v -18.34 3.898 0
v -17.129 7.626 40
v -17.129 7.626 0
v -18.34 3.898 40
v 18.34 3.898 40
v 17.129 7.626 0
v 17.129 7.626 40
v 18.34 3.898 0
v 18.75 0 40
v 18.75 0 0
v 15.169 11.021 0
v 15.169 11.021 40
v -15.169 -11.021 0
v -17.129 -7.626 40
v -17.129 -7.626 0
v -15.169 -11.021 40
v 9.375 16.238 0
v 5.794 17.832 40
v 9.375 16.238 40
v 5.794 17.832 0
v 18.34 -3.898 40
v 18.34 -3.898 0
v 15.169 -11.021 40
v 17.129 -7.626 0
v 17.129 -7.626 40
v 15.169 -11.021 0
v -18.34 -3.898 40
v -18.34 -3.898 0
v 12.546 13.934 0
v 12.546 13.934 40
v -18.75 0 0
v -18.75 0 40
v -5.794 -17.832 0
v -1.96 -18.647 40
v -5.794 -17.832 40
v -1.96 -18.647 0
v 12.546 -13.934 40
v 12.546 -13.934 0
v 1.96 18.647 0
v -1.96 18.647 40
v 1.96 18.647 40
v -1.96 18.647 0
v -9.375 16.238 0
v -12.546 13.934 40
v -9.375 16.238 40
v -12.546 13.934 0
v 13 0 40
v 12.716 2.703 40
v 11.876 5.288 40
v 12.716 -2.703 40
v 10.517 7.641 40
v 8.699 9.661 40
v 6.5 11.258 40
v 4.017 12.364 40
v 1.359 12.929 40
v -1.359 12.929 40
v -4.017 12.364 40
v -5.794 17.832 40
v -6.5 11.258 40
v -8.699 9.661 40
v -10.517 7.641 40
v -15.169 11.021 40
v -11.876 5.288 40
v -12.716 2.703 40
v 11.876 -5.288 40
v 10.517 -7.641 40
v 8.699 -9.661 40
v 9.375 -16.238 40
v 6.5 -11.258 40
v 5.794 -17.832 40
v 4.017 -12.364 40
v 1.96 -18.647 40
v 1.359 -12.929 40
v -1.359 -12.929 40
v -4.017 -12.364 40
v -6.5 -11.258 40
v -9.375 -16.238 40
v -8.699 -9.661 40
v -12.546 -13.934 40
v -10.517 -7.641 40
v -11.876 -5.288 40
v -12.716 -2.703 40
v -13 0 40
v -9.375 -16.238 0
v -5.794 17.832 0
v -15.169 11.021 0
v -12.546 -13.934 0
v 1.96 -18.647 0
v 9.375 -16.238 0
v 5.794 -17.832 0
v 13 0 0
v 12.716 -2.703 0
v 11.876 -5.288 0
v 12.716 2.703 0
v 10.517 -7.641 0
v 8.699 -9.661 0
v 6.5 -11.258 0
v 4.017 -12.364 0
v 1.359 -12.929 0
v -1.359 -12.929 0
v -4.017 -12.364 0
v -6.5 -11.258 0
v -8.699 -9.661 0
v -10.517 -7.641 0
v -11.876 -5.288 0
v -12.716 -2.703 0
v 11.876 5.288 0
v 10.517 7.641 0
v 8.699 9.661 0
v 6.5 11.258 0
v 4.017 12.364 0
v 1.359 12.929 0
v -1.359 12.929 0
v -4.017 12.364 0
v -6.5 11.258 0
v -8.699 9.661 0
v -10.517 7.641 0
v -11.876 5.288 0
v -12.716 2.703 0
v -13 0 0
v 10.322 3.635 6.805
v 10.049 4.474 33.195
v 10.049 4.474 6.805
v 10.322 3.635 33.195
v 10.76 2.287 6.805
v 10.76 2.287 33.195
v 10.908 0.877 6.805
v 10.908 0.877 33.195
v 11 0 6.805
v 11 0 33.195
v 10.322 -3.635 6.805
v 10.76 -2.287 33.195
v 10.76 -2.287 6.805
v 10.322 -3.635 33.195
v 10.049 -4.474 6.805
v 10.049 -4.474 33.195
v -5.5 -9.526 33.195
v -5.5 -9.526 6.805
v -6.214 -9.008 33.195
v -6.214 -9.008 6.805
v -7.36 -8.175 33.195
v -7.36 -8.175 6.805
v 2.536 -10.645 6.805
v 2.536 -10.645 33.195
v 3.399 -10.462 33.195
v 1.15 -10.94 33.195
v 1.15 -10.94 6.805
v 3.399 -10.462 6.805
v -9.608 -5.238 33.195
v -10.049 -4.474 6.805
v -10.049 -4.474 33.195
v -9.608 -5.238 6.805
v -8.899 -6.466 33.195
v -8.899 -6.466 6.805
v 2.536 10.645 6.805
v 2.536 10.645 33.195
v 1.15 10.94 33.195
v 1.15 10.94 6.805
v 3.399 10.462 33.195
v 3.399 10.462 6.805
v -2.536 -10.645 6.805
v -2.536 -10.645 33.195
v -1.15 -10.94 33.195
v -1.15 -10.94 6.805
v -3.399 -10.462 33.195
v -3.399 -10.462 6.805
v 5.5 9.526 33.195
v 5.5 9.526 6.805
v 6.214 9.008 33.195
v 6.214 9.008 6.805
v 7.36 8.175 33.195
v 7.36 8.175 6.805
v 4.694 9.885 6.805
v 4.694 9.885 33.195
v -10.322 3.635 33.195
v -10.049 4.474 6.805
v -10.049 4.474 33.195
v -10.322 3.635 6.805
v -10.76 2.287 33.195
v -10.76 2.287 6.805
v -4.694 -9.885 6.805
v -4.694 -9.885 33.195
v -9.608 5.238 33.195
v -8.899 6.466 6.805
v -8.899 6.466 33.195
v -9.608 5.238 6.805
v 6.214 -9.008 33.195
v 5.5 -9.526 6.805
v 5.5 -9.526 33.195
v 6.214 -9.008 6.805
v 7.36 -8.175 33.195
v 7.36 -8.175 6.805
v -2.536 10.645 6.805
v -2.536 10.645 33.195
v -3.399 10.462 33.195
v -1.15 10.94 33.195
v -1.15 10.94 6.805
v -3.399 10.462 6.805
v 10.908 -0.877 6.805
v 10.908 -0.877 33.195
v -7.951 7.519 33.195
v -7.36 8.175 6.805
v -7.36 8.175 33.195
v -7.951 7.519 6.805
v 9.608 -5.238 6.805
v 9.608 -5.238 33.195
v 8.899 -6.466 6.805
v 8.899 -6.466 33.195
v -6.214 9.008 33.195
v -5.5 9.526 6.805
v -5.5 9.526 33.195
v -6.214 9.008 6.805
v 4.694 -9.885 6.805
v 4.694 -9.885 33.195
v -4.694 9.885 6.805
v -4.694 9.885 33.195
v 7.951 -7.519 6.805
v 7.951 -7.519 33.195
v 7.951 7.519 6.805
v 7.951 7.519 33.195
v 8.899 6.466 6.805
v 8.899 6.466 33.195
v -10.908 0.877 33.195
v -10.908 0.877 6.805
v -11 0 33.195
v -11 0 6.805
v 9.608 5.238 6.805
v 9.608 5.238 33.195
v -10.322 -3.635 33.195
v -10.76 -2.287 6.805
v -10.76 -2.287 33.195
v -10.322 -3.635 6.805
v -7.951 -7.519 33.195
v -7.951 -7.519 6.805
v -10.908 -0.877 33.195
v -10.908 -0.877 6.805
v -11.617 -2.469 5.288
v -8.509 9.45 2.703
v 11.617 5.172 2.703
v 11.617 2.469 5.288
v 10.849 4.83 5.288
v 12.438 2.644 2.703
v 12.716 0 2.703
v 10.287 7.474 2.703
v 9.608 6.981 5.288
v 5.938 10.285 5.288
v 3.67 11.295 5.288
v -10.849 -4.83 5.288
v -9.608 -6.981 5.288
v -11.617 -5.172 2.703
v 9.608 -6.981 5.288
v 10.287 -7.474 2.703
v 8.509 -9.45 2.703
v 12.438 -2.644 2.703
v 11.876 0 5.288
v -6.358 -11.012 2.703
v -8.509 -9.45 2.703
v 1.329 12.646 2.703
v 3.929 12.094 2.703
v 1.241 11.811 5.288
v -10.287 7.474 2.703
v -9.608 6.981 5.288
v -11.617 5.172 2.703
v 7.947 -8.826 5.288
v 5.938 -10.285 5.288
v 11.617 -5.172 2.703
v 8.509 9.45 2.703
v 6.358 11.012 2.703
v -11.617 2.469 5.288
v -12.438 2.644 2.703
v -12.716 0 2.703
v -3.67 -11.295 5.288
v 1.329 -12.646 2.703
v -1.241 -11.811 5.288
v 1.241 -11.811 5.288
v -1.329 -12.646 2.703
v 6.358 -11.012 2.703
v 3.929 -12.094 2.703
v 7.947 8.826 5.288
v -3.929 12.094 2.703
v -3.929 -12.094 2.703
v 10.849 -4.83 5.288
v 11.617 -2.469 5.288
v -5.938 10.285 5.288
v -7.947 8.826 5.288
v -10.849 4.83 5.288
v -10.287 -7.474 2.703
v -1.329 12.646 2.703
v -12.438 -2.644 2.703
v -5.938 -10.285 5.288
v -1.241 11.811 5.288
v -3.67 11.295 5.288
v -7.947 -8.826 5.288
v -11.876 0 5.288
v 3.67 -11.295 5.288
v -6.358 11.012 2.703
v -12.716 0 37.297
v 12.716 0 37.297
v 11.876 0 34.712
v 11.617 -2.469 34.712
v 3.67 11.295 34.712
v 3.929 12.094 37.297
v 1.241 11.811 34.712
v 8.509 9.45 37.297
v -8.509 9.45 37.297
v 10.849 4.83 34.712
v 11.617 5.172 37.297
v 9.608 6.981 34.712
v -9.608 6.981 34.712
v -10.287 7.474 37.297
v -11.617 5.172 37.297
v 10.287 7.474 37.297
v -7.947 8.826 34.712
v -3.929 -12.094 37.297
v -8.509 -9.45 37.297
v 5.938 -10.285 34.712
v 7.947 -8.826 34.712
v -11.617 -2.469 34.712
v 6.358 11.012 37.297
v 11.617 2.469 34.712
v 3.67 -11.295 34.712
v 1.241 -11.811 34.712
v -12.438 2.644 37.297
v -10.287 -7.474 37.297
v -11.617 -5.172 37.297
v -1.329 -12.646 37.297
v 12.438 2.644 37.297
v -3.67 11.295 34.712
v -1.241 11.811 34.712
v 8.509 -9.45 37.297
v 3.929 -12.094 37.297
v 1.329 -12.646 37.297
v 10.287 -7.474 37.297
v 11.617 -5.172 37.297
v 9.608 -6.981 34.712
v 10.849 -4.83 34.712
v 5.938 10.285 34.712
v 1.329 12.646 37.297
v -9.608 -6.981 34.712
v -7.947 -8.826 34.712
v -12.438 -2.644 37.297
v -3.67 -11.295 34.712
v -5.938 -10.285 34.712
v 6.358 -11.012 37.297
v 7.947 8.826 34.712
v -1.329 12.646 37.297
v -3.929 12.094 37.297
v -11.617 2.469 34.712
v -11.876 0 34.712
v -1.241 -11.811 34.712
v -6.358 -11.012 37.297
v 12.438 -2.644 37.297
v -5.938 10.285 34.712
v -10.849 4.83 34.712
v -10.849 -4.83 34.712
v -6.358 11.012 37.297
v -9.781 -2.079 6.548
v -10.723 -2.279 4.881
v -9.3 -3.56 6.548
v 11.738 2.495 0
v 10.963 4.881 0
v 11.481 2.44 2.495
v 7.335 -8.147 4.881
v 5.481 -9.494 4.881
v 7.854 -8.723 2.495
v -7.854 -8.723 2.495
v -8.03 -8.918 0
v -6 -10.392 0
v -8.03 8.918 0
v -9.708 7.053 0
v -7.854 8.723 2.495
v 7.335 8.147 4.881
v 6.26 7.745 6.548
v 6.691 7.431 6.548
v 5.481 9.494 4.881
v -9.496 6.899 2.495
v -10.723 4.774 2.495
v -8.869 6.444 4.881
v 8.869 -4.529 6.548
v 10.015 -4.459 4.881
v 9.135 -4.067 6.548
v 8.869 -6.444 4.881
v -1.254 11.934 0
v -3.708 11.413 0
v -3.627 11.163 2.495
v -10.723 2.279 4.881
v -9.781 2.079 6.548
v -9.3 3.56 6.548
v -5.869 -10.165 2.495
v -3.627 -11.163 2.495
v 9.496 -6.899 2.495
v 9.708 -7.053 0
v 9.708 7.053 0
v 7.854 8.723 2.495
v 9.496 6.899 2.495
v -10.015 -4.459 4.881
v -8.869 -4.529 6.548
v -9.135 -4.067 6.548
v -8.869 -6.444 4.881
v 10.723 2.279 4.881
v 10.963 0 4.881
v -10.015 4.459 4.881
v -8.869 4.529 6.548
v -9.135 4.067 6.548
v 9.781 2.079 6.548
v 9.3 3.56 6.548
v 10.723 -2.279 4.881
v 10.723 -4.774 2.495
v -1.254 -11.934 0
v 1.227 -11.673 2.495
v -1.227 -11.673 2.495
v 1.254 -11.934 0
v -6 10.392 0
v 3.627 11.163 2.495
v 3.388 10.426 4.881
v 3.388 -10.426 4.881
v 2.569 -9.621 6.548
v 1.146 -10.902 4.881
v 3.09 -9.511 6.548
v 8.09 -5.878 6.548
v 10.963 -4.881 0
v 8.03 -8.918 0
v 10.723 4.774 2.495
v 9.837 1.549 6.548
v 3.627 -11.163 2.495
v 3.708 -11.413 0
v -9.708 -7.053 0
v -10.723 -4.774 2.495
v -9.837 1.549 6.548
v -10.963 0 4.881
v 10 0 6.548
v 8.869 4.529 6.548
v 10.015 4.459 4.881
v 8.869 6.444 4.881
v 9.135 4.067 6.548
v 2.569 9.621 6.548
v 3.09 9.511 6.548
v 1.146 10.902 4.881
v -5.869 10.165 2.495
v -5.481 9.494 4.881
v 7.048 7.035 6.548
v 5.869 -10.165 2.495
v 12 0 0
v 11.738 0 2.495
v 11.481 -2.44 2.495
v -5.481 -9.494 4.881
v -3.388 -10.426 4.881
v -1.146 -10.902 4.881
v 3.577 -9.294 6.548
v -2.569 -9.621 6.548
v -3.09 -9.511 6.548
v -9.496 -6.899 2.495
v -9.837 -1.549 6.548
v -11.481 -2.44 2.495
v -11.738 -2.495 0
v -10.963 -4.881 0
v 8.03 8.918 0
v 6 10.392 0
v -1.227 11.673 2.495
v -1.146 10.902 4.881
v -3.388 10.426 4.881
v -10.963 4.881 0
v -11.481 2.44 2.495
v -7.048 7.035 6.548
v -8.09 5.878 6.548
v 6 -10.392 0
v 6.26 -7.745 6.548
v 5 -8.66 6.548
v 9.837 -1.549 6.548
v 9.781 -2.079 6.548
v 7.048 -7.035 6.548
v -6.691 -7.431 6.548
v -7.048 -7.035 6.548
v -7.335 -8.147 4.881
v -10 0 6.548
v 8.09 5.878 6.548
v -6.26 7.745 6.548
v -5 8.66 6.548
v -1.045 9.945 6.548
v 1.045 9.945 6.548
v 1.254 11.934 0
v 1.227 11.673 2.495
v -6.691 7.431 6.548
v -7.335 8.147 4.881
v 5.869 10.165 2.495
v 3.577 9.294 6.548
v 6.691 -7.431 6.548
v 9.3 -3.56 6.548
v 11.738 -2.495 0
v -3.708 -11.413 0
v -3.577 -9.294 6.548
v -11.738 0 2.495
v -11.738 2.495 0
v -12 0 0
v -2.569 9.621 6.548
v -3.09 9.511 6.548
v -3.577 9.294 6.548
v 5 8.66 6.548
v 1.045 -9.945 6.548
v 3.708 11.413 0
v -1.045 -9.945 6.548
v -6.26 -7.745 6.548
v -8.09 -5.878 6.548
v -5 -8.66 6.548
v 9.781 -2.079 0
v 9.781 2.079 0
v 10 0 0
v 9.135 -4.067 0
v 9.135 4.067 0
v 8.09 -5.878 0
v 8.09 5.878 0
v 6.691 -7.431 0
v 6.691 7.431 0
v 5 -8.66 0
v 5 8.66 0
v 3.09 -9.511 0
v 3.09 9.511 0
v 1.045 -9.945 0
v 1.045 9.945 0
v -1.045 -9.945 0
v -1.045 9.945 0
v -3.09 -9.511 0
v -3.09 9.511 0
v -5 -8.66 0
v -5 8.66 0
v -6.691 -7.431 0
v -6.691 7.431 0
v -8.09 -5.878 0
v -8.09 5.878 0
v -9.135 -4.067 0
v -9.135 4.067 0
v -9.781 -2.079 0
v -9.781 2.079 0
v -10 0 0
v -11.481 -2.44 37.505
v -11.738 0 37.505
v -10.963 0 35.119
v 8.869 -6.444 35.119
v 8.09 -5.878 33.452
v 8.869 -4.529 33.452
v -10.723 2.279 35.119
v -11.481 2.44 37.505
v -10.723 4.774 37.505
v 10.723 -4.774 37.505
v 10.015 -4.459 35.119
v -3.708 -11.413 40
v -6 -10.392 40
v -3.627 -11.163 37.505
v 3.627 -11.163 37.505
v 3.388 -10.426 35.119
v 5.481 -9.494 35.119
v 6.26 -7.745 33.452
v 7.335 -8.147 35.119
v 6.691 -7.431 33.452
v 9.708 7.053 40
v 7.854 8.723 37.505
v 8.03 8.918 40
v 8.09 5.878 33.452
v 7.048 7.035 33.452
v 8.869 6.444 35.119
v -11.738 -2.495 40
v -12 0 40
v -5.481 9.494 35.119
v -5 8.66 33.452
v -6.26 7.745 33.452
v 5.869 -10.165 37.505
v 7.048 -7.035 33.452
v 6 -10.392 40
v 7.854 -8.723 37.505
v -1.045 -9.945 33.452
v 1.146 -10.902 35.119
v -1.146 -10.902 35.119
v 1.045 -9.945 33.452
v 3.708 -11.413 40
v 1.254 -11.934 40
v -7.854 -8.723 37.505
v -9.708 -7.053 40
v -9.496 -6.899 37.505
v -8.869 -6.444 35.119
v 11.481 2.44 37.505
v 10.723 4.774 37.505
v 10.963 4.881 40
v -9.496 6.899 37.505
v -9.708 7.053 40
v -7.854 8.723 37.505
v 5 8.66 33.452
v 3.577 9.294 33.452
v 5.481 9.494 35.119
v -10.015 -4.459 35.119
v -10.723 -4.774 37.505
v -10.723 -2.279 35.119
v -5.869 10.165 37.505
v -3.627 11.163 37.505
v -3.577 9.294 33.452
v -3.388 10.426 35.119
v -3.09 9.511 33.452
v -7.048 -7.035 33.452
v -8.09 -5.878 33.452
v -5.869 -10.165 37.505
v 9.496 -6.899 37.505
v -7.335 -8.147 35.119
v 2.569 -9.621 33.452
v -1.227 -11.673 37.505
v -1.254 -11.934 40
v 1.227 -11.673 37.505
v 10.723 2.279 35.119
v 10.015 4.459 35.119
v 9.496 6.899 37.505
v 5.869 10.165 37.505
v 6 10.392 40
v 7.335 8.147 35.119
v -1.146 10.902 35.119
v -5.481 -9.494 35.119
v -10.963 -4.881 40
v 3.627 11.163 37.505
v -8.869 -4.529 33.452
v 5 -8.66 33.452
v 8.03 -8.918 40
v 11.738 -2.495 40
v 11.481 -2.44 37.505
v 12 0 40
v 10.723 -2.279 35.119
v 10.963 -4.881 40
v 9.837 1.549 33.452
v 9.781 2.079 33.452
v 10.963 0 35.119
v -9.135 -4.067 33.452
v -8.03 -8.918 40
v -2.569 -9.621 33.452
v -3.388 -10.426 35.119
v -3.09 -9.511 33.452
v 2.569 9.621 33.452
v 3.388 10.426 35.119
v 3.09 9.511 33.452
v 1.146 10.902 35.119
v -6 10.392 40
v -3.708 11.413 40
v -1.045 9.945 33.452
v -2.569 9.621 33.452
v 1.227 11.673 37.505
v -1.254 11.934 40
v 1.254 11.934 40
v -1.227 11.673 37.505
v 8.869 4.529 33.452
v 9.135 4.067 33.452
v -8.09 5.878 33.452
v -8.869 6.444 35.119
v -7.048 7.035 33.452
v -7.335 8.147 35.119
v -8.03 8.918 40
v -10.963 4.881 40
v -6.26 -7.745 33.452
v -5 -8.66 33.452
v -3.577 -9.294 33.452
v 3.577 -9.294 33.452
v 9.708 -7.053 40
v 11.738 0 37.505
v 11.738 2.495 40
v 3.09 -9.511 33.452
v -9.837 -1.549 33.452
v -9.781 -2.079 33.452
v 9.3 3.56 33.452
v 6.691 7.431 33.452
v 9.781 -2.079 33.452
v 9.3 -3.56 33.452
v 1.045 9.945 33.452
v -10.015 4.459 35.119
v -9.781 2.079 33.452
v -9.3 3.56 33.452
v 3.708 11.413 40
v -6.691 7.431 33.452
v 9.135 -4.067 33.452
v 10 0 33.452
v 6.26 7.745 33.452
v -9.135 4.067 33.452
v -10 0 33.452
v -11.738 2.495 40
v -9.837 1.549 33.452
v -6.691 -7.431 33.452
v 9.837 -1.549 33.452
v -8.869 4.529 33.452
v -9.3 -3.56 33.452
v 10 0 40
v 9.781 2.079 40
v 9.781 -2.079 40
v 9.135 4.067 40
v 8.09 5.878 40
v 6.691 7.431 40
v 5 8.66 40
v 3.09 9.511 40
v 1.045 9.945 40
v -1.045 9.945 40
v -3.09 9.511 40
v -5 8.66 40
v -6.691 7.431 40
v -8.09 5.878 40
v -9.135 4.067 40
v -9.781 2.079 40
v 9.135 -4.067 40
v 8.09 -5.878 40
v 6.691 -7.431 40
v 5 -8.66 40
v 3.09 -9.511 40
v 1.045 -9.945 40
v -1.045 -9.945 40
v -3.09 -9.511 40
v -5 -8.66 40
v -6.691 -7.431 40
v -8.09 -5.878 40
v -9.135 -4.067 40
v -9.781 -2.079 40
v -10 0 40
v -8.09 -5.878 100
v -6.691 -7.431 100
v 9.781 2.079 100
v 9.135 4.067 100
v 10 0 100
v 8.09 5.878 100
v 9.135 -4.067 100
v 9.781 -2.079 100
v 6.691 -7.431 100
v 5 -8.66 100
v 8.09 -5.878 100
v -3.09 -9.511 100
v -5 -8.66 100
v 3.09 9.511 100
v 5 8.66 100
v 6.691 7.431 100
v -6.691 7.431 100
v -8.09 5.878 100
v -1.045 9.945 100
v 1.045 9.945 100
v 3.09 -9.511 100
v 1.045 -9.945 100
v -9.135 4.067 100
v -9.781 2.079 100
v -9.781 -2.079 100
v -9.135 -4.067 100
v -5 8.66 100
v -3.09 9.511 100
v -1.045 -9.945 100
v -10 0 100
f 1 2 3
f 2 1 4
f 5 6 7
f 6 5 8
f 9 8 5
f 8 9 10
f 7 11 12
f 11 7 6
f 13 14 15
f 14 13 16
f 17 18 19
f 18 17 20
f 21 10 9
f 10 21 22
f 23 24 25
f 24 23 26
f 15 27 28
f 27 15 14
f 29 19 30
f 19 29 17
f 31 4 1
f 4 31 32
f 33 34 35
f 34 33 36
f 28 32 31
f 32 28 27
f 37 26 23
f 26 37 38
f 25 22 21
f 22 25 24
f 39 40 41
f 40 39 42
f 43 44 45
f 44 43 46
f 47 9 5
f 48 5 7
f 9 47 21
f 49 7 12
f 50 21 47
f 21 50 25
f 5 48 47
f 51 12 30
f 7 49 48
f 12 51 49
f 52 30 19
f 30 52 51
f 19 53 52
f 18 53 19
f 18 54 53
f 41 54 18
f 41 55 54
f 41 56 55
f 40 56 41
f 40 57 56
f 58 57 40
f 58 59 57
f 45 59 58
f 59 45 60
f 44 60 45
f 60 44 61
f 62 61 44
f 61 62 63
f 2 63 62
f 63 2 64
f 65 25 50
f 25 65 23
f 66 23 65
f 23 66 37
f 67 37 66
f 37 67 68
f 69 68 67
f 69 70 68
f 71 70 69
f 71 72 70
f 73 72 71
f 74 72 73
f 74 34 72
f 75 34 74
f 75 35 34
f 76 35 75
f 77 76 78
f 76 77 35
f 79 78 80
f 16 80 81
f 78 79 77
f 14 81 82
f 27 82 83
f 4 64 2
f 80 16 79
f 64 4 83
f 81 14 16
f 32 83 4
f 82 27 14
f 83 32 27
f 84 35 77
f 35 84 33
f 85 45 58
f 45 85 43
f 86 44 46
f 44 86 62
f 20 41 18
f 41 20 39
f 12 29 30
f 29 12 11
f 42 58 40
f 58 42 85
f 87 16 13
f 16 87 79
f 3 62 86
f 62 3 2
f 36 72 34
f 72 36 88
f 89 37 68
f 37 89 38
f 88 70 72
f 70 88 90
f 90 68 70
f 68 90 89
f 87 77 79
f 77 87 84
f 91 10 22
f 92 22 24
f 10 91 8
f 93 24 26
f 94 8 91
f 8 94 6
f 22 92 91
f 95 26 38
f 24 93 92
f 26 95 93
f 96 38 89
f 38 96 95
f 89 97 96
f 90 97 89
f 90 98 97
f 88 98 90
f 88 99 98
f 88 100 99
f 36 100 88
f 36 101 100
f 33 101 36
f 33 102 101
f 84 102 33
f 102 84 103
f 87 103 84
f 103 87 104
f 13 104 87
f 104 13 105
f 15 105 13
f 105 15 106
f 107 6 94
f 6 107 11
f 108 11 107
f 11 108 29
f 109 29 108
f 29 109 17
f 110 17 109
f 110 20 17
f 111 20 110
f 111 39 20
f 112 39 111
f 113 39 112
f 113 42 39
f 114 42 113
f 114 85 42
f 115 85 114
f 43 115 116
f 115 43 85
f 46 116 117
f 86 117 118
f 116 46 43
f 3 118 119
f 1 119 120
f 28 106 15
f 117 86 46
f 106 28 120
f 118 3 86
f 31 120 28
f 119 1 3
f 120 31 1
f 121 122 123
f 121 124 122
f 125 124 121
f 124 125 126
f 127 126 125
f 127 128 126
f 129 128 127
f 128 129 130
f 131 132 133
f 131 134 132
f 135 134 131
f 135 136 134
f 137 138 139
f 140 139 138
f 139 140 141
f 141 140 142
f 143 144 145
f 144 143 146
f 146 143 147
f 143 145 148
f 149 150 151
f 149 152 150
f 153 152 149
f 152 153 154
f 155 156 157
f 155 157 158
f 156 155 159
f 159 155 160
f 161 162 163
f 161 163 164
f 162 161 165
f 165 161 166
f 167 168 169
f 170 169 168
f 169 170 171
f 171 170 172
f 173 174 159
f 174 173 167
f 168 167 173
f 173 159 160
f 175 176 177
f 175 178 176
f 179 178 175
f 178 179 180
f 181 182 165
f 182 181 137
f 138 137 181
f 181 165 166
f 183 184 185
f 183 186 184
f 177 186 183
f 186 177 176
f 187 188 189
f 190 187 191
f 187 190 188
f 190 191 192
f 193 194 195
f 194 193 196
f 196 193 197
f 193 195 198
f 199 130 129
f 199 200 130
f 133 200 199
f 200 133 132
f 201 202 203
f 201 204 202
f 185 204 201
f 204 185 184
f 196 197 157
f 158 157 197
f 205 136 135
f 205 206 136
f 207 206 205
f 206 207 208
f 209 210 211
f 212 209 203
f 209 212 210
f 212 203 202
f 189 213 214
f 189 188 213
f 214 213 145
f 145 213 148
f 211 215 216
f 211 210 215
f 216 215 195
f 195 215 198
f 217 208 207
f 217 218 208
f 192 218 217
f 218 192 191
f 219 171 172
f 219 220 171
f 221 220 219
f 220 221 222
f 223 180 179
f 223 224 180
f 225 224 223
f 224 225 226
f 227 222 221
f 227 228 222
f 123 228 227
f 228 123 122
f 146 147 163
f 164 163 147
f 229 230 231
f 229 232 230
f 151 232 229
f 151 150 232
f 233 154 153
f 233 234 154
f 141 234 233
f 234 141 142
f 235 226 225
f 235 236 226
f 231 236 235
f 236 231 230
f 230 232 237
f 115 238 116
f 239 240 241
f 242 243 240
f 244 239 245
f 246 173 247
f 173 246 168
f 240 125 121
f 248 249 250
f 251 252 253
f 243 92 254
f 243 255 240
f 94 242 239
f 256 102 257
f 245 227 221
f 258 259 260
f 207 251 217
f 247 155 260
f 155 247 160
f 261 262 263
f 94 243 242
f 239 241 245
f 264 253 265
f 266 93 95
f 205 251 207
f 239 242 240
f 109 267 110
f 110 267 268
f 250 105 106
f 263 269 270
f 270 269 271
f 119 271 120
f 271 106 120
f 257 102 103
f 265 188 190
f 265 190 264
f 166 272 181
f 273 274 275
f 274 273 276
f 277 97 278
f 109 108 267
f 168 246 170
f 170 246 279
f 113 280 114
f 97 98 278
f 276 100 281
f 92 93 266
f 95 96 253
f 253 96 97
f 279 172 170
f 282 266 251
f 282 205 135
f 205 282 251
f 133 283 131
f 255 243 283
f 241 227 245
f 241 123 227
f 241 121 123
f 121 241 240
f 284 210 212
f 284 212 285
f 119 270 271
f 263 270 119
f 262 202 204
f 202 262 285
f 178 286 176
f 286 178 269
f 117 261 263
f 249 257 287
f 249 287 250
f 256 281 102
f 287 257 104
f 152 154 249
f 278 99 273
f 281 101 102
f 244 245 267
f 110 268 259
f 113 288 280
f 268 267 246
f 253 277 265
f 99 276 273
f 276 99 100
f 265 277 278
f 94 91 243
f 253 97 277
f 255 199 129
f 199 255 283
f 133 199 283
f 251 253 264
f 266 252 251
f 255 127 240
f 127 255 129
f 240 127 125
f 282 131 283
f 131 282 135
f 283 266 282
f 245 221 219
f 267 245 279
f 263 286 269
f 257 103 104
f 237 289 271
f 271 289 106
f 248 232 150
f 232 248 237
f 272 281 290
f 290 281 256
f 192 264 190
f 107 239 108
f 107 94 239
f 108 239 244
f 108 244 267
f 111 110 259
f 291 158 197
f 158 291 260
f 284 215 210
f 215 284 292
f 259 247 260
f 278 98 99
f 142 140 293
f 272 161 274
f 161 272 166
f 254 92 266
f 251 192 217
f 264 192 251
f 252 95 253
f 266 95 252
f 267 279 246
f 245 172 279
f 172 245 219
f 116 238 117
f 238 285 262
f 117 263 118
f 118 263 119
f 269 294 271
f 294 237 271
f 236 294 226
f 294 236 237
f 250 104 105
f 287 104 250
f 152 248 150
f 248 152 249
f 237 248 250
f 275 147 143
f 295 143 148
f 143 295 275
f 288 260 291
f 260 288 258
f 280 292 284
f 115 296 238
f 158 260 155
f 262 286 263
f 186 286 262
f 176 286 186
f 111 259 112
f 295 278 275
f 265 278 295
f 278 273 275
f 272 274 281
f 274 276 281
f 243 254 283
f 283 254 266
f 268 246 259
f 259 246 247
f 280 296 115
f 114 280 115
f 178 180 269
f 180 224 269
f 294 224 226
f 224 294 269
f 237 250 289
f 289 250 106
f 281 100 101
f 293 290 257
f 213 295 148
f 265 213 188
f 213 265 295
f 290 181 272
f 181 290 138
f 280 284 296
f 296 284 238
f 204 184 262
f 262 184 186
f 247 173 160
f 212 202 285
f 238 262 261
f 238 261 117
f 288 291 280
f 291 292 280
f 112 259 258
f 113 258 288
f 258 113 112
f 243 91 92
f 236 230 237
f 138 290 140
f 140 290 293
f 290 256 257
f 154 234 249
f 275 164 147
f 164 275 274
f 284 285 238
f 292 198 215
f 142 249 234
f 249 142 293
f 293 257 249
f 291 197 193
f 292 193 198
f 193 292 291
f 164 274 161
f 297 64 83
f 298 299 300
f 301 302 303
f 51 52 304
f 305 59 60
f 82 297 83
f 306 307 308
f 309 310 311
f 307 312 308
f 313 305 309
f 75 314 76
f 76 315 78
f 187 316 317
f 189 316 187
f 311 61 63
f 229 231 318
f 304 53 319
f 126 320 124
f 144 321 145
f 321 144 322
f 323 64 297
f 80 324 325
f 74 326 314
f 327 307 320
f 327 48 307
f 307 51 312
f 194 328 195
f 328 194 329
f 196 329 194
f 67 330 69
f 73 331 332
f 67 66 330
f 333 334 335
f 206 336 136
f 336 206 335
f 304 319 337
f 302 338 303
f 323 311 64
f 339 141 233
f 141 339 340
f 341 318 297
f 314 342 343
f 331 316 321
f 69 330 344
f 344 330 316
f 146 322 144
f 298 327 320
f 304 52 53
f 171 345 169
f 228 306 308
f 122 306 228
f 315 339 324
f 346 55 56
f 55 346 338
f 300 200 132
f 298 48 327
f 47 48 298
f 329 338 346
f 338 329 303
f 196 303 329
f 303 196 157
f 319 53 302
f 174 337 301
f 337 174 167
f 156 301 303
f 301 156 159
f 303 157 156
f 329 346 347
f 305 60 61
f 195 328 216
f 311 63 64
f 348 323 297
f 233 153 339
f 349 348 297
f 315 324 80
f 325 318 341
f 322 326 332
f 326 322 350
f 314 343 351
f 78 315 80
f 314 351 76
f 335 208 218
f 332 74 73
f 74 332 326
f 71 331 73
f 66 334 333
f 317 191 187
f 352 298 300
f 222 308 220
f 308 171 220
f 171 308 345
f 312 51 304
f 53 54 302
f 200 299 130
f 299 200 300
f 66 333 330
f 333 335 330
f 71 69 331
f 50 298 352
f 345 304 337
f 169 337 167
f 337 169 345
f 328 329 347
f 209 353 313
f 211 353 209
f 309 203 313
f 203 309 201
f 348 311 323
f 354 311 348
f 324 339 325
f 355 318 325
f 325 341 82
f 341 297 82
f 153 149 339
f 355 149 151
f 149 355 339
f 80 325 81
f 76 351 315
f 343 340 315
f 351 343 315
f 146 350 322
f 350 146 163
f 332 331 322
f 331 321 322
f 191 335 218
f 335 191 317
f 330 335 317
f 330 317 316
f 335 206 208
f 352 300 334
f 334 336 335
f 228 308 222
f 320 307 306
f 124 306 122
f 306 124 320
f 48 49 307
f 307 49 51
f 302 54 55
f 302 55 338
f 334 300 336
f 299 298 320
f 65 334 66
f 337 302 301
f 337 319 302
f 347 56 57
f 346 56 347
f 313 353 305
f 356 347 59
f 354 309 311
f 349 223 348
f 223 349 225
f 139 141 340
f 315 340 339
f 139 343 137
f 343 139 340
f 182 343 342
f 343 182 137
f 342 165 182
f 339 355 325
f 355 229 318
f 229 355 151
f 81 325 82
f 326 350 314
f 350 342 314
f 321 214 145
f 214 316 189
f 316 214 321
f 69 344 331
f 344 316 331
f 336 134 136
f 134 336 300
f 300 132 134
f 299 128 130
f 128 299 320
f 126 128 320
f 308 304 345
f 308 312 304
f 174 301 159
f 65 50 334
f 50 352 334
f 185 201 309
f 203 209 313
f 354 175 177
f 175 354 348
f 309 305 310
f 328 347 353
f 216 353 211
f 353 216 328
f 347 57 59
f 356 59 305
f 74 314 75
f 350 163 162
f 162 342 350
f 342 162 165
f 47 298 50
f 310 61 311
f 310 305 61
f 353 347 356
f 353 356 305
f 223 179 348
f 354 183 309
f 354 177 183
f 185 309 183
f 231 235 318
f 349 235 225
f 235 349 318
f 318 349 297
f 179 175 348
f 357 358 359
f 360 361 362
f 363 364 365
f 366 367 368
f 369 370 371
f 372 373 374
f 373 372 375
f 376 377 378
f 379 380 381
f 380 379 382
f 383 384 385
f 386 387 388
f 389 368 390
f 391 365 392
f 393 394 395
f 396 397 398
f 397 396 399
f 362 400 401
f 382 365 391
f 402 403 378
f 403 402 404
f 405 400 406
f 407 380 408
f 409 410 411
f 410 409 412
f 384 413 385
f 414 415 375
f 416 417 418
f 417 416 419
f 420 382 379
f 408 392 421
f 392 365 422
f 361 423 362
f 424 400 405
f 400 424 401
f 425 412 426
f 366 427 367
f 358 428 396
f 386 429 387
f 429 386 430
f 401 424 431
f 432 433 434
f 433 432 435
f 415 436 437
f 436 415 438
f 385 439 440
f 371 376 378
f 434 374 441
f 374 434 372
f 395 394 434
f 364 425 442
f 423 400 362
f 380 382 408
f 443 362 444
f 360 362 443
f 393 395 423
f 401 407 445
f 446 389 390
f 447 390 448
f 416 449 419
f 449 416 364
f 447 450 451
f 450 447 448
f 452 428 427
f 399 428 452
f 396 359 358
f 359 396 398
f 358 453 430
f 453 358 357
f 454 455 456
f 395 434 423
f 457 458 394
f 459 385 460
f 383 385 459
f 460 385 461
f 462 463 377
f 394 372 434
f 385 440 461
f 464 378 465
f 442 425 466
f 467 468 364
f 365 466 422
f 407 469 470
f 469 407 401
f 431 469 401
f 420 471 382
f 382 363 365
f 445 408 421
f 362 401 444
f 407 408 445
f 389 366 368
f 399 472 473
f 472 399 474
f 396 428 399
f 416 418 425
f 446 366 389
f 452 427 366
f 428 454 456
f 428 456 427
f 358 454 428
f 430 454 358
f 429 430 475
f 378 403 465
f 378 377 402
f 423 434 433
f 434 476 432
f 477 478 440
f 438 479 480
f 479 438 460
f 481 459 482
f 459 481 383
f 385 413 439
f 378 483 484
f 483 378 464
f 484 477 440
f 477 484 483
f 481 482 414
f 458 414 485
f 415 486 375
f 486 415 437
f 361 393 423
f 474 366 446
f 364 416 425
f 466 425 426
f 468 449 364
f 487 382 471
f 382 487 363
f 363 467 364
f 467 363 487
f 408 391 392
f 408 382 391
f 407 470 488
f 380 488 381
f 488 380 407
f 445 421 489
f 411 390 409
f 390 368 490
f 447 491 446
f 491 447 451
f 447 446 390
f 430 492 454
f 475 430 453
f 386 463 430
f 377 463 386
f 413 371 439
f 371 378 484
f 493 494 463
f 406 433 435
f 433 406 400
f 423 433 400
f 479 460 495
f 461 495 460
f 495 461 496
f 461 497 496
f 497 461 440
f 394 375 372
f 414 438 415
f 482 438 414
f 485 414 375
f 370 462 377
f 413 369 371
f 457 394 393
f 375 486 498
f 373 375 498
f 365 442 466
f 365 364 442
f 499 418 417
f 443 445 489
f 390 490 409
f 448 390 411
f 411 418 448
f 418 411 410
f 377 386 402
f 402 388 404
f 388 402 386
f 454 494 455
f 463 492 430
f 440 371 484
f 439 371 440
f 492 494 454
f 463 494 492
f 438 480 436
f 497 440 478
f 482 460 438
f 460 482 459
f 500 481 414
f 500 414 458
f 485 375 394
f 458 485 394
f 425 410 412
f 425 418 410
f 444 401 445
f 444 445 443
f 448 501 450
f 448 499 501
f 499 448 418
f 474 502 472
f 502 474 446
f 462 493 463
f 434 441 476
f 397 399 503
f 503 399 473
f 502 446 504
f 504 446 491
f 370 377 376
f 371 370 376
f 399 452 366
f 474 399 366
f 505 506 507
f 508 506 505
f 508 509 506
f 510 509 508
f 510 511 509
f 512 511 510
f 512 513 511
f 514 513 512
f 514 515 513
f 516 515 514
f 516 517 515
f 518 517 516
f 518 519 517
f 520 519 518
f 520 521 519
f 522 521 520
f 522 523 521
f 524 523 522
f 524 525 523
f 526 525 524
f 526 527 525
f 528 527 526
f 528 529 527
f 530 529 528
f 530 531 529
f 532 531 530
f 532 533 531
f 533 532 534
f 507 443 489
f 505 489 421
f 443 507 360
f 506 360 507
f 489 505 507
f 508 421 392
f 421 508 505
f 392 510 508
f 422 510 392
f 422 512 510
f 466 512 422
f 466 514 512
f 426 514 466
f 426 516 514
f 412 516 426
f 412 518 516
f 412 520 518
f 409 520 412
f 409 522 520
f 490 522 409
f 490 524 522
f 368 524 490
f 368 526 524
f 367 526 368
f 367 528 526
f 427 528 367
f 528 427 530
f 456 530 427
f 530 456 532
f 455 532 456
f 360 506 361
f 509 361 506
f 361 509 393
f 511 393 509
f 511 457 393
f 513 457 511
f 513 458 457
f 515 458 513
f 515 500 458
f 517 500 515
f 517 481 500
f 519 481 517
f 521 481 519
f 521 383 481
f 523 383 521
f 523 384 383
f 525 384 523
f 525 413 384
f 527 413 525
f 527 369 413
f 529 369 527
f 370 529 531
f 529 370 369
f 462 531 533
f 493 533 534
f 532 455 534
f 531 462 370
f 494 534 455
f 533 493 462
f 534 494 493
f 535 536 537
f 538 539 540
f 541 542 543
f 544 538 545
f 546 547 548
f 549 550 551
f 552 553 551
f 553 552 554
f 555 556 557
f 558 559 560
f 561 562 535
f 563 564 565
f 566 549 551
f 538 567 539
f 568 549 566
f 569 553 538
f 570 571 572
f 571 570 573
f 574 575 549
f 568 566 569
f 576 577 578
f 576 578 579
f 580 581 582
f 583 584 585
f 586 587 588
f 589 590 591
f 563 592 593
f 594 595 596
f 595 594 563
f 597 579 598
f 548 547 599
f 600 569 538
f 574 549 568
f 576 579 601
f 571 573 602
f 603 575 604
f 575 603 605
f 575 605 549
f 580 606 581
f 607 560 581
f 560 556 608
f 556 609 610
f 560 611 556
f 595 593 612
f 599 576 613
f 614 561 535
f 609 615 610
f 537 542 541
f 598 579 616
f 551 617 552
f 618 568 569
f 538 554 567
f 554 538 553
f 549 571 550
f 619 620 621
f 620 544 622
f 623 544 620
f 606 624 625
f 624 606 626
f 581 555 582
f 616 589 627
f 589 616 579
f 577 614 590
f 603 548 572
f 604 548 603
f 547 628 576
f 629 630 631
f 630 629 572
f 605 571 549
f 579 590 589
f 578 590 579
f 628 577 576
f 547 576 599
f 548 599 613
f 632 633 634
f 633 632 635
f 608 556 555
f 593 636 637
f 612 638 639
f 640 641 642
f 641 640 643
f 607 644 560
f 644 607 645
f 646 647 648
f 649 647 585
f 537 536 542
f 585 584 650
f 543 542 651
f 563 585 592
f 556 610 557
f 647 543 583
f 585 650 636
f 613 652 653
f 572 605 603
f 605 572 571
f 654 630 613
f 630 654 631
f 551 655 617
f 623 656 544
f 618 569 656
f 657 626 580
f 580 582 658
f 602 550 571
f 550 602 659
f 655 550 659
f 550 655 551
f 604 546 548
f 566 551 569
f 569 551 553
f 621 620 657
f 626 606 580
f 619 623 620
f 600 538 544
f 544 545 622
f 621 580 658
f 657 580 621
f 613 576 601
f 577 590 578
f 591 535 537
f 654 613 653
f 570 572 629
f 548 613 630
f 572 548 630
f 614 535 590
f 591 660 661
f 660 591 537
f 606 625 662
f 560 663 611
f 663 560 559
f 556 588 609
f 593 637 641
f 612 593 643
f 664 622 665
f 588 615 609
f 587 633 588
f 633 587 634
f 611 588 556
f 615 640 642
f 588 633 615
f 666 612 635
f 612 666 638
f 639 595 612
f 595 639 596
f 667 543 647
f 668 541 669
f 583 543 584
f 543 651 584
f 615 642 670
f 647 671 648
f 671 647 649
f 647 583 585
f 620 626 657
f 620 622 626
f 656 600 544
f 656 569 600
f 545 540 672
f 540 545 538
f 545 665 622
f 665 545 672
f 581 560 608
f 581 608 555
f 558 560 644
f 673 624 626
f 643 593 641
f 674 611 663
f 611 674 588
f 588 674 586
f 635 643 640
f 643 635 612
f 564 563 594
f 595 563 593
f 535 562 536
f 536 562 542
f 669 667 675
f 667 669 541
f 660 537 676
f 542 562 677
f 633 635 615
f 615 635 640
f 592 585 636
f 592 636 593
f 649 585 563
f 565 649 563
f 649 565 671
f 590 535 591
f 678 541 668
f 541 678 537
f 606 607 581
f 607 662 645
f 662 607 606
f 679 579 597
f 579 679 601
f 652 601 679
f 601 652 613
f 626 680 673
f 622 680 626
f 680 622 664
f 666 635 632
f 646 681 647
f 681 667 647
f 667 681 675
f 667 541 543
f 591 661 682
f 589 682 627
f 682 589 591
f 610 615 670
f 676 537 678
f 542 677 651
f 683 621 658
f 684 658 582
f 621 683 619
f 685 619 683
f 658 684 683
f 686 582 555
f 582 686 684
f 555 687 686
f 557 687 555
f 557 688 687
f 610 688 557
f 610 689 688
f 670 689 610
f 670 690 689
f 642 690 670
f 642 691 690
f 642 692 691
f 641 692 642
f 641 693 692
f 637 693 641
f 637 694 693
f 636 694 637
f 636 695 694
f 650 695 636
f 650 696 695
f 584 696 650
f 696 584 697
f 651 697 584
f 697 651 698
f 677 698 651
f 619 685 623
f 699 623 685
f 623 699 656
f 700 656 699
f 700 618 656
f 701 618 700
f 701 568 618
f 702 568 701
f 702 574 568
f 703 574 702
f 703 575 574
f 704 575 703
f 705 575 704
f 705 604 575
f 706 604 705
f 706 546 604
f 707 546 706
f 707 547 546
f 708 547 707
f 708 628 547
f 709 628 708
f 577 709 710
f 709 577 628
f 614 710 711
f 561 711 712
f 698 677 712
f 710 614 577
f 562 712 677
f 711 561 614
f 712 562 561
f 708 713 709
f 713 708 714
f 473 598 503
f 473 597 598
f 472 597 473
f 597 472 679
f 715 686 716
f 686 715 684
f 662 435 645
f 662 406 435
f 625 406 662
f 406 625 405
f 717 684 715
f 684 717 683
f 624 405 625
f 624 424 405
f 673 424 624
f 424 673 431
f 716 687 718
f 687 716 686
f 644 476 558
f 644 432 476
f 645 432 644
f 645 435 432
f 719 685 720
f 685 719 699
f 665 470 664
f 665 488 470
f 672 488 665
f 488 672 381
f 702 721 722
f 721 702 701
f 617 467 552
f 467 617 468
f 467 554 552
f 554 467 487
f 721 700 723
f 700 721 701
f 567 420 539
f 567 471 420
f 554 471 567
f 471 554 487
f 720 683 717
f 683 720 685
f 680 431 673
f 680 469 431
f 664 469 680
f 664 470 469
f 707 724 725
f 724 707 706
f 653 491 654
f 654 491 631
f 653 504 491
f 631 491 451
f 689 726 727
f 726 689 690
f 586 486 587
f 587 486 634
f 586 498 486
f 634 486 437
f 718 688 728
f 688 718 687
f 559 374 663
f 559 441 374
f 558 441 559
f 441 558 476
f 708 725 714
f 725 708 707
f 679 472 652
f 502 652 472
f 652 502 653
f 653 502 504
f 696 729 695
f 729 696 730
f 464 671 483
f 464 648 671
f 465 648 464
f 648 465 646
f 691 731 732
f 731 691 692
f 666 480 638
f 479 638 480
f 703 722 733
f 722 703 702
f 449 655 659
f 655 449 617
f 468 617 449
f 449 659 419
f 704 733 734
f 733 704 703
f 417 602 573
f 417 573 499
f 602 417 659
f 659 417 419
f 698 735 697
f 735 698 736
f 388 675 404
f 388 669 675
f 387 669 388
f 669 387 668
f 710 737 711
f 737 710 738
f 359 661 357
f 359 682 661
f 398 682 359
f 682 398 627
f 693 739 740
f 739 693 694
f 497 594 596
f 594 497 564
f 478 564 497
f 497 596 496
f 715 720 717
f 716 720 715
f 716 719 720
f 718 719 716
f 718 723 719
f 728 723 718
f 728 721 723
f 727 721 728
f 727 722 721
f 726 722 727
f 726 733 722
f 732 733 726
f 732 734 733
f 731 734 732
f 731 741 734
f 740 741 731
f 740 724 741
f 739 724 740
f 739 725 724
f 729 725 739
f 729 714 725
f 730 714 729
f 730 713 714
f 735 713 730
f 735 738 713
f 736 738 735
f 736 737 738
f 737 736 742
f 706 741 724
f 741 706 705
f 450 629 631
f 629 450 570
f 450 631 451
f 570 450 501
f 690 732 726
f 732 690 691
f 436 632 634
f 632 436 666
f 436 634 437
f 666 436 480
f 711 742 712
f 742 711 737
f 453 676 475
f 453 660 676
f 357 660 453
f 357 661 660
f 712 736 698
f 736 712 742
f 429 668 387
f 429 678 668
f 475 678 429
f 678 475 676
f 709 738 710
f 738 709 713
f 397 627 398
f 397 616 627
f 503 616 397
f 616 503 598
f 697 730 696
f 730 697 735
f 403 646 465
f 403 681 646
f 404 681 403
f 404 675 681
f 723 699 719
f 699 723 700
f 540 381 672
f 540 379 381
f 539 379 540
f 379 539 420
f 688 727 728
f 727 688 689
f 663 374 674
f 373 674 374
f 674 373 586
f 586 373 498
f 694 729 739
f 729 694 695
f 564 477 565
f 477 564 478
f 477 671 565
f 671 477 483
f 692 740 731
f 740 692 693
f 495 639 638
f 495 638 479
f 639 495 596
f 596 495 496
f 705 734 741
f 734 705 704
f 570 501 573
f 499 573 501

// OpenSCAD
bodyHeight=40;
bodyWidth=37.5;
stickHeight=100;
stickWidth=20;
stickLocker=24;
grabHeight=40;
grabWidth=20;
grabOffset=4;

module body(){
    offset = 2;
    difference(){
        cylinder(h=bodyHeight,d=bodyWidth);
        cylinder(h=stickHeight,d=stickWidth+offset);
        sphere(d=stickLocker+offset);
        translate([0,0,bodyHeight]) sphere(d=stickLocker+offset);
    }
}

module stick(){
    cylinder(h=stickHeight,d=stickWidth);
    halfSphere(stickLocker,1);
    translate([0,0,bodyHeight]) halfSphere(stickLocker,-1);
}

module grab(){
    difference(){
        union(){
            cylinder(h=grabHeight,d=grabWidth);
            halfSphere(stickLocker,1);
            translate([0,0,bodyHeight]) halfSphere(stickLocker,-1);
        }
        translate([0,0,grabOffset]) cylinder(h=grabHeight,d=grabWidth-grabOffset);
    }
}

module halfSphere(d, dir){
    difference(){
        sphere(d=d);
        translate([0,0,(d/2)*-dir]) cube(d,center=true);
    }
}

body();
stick();
